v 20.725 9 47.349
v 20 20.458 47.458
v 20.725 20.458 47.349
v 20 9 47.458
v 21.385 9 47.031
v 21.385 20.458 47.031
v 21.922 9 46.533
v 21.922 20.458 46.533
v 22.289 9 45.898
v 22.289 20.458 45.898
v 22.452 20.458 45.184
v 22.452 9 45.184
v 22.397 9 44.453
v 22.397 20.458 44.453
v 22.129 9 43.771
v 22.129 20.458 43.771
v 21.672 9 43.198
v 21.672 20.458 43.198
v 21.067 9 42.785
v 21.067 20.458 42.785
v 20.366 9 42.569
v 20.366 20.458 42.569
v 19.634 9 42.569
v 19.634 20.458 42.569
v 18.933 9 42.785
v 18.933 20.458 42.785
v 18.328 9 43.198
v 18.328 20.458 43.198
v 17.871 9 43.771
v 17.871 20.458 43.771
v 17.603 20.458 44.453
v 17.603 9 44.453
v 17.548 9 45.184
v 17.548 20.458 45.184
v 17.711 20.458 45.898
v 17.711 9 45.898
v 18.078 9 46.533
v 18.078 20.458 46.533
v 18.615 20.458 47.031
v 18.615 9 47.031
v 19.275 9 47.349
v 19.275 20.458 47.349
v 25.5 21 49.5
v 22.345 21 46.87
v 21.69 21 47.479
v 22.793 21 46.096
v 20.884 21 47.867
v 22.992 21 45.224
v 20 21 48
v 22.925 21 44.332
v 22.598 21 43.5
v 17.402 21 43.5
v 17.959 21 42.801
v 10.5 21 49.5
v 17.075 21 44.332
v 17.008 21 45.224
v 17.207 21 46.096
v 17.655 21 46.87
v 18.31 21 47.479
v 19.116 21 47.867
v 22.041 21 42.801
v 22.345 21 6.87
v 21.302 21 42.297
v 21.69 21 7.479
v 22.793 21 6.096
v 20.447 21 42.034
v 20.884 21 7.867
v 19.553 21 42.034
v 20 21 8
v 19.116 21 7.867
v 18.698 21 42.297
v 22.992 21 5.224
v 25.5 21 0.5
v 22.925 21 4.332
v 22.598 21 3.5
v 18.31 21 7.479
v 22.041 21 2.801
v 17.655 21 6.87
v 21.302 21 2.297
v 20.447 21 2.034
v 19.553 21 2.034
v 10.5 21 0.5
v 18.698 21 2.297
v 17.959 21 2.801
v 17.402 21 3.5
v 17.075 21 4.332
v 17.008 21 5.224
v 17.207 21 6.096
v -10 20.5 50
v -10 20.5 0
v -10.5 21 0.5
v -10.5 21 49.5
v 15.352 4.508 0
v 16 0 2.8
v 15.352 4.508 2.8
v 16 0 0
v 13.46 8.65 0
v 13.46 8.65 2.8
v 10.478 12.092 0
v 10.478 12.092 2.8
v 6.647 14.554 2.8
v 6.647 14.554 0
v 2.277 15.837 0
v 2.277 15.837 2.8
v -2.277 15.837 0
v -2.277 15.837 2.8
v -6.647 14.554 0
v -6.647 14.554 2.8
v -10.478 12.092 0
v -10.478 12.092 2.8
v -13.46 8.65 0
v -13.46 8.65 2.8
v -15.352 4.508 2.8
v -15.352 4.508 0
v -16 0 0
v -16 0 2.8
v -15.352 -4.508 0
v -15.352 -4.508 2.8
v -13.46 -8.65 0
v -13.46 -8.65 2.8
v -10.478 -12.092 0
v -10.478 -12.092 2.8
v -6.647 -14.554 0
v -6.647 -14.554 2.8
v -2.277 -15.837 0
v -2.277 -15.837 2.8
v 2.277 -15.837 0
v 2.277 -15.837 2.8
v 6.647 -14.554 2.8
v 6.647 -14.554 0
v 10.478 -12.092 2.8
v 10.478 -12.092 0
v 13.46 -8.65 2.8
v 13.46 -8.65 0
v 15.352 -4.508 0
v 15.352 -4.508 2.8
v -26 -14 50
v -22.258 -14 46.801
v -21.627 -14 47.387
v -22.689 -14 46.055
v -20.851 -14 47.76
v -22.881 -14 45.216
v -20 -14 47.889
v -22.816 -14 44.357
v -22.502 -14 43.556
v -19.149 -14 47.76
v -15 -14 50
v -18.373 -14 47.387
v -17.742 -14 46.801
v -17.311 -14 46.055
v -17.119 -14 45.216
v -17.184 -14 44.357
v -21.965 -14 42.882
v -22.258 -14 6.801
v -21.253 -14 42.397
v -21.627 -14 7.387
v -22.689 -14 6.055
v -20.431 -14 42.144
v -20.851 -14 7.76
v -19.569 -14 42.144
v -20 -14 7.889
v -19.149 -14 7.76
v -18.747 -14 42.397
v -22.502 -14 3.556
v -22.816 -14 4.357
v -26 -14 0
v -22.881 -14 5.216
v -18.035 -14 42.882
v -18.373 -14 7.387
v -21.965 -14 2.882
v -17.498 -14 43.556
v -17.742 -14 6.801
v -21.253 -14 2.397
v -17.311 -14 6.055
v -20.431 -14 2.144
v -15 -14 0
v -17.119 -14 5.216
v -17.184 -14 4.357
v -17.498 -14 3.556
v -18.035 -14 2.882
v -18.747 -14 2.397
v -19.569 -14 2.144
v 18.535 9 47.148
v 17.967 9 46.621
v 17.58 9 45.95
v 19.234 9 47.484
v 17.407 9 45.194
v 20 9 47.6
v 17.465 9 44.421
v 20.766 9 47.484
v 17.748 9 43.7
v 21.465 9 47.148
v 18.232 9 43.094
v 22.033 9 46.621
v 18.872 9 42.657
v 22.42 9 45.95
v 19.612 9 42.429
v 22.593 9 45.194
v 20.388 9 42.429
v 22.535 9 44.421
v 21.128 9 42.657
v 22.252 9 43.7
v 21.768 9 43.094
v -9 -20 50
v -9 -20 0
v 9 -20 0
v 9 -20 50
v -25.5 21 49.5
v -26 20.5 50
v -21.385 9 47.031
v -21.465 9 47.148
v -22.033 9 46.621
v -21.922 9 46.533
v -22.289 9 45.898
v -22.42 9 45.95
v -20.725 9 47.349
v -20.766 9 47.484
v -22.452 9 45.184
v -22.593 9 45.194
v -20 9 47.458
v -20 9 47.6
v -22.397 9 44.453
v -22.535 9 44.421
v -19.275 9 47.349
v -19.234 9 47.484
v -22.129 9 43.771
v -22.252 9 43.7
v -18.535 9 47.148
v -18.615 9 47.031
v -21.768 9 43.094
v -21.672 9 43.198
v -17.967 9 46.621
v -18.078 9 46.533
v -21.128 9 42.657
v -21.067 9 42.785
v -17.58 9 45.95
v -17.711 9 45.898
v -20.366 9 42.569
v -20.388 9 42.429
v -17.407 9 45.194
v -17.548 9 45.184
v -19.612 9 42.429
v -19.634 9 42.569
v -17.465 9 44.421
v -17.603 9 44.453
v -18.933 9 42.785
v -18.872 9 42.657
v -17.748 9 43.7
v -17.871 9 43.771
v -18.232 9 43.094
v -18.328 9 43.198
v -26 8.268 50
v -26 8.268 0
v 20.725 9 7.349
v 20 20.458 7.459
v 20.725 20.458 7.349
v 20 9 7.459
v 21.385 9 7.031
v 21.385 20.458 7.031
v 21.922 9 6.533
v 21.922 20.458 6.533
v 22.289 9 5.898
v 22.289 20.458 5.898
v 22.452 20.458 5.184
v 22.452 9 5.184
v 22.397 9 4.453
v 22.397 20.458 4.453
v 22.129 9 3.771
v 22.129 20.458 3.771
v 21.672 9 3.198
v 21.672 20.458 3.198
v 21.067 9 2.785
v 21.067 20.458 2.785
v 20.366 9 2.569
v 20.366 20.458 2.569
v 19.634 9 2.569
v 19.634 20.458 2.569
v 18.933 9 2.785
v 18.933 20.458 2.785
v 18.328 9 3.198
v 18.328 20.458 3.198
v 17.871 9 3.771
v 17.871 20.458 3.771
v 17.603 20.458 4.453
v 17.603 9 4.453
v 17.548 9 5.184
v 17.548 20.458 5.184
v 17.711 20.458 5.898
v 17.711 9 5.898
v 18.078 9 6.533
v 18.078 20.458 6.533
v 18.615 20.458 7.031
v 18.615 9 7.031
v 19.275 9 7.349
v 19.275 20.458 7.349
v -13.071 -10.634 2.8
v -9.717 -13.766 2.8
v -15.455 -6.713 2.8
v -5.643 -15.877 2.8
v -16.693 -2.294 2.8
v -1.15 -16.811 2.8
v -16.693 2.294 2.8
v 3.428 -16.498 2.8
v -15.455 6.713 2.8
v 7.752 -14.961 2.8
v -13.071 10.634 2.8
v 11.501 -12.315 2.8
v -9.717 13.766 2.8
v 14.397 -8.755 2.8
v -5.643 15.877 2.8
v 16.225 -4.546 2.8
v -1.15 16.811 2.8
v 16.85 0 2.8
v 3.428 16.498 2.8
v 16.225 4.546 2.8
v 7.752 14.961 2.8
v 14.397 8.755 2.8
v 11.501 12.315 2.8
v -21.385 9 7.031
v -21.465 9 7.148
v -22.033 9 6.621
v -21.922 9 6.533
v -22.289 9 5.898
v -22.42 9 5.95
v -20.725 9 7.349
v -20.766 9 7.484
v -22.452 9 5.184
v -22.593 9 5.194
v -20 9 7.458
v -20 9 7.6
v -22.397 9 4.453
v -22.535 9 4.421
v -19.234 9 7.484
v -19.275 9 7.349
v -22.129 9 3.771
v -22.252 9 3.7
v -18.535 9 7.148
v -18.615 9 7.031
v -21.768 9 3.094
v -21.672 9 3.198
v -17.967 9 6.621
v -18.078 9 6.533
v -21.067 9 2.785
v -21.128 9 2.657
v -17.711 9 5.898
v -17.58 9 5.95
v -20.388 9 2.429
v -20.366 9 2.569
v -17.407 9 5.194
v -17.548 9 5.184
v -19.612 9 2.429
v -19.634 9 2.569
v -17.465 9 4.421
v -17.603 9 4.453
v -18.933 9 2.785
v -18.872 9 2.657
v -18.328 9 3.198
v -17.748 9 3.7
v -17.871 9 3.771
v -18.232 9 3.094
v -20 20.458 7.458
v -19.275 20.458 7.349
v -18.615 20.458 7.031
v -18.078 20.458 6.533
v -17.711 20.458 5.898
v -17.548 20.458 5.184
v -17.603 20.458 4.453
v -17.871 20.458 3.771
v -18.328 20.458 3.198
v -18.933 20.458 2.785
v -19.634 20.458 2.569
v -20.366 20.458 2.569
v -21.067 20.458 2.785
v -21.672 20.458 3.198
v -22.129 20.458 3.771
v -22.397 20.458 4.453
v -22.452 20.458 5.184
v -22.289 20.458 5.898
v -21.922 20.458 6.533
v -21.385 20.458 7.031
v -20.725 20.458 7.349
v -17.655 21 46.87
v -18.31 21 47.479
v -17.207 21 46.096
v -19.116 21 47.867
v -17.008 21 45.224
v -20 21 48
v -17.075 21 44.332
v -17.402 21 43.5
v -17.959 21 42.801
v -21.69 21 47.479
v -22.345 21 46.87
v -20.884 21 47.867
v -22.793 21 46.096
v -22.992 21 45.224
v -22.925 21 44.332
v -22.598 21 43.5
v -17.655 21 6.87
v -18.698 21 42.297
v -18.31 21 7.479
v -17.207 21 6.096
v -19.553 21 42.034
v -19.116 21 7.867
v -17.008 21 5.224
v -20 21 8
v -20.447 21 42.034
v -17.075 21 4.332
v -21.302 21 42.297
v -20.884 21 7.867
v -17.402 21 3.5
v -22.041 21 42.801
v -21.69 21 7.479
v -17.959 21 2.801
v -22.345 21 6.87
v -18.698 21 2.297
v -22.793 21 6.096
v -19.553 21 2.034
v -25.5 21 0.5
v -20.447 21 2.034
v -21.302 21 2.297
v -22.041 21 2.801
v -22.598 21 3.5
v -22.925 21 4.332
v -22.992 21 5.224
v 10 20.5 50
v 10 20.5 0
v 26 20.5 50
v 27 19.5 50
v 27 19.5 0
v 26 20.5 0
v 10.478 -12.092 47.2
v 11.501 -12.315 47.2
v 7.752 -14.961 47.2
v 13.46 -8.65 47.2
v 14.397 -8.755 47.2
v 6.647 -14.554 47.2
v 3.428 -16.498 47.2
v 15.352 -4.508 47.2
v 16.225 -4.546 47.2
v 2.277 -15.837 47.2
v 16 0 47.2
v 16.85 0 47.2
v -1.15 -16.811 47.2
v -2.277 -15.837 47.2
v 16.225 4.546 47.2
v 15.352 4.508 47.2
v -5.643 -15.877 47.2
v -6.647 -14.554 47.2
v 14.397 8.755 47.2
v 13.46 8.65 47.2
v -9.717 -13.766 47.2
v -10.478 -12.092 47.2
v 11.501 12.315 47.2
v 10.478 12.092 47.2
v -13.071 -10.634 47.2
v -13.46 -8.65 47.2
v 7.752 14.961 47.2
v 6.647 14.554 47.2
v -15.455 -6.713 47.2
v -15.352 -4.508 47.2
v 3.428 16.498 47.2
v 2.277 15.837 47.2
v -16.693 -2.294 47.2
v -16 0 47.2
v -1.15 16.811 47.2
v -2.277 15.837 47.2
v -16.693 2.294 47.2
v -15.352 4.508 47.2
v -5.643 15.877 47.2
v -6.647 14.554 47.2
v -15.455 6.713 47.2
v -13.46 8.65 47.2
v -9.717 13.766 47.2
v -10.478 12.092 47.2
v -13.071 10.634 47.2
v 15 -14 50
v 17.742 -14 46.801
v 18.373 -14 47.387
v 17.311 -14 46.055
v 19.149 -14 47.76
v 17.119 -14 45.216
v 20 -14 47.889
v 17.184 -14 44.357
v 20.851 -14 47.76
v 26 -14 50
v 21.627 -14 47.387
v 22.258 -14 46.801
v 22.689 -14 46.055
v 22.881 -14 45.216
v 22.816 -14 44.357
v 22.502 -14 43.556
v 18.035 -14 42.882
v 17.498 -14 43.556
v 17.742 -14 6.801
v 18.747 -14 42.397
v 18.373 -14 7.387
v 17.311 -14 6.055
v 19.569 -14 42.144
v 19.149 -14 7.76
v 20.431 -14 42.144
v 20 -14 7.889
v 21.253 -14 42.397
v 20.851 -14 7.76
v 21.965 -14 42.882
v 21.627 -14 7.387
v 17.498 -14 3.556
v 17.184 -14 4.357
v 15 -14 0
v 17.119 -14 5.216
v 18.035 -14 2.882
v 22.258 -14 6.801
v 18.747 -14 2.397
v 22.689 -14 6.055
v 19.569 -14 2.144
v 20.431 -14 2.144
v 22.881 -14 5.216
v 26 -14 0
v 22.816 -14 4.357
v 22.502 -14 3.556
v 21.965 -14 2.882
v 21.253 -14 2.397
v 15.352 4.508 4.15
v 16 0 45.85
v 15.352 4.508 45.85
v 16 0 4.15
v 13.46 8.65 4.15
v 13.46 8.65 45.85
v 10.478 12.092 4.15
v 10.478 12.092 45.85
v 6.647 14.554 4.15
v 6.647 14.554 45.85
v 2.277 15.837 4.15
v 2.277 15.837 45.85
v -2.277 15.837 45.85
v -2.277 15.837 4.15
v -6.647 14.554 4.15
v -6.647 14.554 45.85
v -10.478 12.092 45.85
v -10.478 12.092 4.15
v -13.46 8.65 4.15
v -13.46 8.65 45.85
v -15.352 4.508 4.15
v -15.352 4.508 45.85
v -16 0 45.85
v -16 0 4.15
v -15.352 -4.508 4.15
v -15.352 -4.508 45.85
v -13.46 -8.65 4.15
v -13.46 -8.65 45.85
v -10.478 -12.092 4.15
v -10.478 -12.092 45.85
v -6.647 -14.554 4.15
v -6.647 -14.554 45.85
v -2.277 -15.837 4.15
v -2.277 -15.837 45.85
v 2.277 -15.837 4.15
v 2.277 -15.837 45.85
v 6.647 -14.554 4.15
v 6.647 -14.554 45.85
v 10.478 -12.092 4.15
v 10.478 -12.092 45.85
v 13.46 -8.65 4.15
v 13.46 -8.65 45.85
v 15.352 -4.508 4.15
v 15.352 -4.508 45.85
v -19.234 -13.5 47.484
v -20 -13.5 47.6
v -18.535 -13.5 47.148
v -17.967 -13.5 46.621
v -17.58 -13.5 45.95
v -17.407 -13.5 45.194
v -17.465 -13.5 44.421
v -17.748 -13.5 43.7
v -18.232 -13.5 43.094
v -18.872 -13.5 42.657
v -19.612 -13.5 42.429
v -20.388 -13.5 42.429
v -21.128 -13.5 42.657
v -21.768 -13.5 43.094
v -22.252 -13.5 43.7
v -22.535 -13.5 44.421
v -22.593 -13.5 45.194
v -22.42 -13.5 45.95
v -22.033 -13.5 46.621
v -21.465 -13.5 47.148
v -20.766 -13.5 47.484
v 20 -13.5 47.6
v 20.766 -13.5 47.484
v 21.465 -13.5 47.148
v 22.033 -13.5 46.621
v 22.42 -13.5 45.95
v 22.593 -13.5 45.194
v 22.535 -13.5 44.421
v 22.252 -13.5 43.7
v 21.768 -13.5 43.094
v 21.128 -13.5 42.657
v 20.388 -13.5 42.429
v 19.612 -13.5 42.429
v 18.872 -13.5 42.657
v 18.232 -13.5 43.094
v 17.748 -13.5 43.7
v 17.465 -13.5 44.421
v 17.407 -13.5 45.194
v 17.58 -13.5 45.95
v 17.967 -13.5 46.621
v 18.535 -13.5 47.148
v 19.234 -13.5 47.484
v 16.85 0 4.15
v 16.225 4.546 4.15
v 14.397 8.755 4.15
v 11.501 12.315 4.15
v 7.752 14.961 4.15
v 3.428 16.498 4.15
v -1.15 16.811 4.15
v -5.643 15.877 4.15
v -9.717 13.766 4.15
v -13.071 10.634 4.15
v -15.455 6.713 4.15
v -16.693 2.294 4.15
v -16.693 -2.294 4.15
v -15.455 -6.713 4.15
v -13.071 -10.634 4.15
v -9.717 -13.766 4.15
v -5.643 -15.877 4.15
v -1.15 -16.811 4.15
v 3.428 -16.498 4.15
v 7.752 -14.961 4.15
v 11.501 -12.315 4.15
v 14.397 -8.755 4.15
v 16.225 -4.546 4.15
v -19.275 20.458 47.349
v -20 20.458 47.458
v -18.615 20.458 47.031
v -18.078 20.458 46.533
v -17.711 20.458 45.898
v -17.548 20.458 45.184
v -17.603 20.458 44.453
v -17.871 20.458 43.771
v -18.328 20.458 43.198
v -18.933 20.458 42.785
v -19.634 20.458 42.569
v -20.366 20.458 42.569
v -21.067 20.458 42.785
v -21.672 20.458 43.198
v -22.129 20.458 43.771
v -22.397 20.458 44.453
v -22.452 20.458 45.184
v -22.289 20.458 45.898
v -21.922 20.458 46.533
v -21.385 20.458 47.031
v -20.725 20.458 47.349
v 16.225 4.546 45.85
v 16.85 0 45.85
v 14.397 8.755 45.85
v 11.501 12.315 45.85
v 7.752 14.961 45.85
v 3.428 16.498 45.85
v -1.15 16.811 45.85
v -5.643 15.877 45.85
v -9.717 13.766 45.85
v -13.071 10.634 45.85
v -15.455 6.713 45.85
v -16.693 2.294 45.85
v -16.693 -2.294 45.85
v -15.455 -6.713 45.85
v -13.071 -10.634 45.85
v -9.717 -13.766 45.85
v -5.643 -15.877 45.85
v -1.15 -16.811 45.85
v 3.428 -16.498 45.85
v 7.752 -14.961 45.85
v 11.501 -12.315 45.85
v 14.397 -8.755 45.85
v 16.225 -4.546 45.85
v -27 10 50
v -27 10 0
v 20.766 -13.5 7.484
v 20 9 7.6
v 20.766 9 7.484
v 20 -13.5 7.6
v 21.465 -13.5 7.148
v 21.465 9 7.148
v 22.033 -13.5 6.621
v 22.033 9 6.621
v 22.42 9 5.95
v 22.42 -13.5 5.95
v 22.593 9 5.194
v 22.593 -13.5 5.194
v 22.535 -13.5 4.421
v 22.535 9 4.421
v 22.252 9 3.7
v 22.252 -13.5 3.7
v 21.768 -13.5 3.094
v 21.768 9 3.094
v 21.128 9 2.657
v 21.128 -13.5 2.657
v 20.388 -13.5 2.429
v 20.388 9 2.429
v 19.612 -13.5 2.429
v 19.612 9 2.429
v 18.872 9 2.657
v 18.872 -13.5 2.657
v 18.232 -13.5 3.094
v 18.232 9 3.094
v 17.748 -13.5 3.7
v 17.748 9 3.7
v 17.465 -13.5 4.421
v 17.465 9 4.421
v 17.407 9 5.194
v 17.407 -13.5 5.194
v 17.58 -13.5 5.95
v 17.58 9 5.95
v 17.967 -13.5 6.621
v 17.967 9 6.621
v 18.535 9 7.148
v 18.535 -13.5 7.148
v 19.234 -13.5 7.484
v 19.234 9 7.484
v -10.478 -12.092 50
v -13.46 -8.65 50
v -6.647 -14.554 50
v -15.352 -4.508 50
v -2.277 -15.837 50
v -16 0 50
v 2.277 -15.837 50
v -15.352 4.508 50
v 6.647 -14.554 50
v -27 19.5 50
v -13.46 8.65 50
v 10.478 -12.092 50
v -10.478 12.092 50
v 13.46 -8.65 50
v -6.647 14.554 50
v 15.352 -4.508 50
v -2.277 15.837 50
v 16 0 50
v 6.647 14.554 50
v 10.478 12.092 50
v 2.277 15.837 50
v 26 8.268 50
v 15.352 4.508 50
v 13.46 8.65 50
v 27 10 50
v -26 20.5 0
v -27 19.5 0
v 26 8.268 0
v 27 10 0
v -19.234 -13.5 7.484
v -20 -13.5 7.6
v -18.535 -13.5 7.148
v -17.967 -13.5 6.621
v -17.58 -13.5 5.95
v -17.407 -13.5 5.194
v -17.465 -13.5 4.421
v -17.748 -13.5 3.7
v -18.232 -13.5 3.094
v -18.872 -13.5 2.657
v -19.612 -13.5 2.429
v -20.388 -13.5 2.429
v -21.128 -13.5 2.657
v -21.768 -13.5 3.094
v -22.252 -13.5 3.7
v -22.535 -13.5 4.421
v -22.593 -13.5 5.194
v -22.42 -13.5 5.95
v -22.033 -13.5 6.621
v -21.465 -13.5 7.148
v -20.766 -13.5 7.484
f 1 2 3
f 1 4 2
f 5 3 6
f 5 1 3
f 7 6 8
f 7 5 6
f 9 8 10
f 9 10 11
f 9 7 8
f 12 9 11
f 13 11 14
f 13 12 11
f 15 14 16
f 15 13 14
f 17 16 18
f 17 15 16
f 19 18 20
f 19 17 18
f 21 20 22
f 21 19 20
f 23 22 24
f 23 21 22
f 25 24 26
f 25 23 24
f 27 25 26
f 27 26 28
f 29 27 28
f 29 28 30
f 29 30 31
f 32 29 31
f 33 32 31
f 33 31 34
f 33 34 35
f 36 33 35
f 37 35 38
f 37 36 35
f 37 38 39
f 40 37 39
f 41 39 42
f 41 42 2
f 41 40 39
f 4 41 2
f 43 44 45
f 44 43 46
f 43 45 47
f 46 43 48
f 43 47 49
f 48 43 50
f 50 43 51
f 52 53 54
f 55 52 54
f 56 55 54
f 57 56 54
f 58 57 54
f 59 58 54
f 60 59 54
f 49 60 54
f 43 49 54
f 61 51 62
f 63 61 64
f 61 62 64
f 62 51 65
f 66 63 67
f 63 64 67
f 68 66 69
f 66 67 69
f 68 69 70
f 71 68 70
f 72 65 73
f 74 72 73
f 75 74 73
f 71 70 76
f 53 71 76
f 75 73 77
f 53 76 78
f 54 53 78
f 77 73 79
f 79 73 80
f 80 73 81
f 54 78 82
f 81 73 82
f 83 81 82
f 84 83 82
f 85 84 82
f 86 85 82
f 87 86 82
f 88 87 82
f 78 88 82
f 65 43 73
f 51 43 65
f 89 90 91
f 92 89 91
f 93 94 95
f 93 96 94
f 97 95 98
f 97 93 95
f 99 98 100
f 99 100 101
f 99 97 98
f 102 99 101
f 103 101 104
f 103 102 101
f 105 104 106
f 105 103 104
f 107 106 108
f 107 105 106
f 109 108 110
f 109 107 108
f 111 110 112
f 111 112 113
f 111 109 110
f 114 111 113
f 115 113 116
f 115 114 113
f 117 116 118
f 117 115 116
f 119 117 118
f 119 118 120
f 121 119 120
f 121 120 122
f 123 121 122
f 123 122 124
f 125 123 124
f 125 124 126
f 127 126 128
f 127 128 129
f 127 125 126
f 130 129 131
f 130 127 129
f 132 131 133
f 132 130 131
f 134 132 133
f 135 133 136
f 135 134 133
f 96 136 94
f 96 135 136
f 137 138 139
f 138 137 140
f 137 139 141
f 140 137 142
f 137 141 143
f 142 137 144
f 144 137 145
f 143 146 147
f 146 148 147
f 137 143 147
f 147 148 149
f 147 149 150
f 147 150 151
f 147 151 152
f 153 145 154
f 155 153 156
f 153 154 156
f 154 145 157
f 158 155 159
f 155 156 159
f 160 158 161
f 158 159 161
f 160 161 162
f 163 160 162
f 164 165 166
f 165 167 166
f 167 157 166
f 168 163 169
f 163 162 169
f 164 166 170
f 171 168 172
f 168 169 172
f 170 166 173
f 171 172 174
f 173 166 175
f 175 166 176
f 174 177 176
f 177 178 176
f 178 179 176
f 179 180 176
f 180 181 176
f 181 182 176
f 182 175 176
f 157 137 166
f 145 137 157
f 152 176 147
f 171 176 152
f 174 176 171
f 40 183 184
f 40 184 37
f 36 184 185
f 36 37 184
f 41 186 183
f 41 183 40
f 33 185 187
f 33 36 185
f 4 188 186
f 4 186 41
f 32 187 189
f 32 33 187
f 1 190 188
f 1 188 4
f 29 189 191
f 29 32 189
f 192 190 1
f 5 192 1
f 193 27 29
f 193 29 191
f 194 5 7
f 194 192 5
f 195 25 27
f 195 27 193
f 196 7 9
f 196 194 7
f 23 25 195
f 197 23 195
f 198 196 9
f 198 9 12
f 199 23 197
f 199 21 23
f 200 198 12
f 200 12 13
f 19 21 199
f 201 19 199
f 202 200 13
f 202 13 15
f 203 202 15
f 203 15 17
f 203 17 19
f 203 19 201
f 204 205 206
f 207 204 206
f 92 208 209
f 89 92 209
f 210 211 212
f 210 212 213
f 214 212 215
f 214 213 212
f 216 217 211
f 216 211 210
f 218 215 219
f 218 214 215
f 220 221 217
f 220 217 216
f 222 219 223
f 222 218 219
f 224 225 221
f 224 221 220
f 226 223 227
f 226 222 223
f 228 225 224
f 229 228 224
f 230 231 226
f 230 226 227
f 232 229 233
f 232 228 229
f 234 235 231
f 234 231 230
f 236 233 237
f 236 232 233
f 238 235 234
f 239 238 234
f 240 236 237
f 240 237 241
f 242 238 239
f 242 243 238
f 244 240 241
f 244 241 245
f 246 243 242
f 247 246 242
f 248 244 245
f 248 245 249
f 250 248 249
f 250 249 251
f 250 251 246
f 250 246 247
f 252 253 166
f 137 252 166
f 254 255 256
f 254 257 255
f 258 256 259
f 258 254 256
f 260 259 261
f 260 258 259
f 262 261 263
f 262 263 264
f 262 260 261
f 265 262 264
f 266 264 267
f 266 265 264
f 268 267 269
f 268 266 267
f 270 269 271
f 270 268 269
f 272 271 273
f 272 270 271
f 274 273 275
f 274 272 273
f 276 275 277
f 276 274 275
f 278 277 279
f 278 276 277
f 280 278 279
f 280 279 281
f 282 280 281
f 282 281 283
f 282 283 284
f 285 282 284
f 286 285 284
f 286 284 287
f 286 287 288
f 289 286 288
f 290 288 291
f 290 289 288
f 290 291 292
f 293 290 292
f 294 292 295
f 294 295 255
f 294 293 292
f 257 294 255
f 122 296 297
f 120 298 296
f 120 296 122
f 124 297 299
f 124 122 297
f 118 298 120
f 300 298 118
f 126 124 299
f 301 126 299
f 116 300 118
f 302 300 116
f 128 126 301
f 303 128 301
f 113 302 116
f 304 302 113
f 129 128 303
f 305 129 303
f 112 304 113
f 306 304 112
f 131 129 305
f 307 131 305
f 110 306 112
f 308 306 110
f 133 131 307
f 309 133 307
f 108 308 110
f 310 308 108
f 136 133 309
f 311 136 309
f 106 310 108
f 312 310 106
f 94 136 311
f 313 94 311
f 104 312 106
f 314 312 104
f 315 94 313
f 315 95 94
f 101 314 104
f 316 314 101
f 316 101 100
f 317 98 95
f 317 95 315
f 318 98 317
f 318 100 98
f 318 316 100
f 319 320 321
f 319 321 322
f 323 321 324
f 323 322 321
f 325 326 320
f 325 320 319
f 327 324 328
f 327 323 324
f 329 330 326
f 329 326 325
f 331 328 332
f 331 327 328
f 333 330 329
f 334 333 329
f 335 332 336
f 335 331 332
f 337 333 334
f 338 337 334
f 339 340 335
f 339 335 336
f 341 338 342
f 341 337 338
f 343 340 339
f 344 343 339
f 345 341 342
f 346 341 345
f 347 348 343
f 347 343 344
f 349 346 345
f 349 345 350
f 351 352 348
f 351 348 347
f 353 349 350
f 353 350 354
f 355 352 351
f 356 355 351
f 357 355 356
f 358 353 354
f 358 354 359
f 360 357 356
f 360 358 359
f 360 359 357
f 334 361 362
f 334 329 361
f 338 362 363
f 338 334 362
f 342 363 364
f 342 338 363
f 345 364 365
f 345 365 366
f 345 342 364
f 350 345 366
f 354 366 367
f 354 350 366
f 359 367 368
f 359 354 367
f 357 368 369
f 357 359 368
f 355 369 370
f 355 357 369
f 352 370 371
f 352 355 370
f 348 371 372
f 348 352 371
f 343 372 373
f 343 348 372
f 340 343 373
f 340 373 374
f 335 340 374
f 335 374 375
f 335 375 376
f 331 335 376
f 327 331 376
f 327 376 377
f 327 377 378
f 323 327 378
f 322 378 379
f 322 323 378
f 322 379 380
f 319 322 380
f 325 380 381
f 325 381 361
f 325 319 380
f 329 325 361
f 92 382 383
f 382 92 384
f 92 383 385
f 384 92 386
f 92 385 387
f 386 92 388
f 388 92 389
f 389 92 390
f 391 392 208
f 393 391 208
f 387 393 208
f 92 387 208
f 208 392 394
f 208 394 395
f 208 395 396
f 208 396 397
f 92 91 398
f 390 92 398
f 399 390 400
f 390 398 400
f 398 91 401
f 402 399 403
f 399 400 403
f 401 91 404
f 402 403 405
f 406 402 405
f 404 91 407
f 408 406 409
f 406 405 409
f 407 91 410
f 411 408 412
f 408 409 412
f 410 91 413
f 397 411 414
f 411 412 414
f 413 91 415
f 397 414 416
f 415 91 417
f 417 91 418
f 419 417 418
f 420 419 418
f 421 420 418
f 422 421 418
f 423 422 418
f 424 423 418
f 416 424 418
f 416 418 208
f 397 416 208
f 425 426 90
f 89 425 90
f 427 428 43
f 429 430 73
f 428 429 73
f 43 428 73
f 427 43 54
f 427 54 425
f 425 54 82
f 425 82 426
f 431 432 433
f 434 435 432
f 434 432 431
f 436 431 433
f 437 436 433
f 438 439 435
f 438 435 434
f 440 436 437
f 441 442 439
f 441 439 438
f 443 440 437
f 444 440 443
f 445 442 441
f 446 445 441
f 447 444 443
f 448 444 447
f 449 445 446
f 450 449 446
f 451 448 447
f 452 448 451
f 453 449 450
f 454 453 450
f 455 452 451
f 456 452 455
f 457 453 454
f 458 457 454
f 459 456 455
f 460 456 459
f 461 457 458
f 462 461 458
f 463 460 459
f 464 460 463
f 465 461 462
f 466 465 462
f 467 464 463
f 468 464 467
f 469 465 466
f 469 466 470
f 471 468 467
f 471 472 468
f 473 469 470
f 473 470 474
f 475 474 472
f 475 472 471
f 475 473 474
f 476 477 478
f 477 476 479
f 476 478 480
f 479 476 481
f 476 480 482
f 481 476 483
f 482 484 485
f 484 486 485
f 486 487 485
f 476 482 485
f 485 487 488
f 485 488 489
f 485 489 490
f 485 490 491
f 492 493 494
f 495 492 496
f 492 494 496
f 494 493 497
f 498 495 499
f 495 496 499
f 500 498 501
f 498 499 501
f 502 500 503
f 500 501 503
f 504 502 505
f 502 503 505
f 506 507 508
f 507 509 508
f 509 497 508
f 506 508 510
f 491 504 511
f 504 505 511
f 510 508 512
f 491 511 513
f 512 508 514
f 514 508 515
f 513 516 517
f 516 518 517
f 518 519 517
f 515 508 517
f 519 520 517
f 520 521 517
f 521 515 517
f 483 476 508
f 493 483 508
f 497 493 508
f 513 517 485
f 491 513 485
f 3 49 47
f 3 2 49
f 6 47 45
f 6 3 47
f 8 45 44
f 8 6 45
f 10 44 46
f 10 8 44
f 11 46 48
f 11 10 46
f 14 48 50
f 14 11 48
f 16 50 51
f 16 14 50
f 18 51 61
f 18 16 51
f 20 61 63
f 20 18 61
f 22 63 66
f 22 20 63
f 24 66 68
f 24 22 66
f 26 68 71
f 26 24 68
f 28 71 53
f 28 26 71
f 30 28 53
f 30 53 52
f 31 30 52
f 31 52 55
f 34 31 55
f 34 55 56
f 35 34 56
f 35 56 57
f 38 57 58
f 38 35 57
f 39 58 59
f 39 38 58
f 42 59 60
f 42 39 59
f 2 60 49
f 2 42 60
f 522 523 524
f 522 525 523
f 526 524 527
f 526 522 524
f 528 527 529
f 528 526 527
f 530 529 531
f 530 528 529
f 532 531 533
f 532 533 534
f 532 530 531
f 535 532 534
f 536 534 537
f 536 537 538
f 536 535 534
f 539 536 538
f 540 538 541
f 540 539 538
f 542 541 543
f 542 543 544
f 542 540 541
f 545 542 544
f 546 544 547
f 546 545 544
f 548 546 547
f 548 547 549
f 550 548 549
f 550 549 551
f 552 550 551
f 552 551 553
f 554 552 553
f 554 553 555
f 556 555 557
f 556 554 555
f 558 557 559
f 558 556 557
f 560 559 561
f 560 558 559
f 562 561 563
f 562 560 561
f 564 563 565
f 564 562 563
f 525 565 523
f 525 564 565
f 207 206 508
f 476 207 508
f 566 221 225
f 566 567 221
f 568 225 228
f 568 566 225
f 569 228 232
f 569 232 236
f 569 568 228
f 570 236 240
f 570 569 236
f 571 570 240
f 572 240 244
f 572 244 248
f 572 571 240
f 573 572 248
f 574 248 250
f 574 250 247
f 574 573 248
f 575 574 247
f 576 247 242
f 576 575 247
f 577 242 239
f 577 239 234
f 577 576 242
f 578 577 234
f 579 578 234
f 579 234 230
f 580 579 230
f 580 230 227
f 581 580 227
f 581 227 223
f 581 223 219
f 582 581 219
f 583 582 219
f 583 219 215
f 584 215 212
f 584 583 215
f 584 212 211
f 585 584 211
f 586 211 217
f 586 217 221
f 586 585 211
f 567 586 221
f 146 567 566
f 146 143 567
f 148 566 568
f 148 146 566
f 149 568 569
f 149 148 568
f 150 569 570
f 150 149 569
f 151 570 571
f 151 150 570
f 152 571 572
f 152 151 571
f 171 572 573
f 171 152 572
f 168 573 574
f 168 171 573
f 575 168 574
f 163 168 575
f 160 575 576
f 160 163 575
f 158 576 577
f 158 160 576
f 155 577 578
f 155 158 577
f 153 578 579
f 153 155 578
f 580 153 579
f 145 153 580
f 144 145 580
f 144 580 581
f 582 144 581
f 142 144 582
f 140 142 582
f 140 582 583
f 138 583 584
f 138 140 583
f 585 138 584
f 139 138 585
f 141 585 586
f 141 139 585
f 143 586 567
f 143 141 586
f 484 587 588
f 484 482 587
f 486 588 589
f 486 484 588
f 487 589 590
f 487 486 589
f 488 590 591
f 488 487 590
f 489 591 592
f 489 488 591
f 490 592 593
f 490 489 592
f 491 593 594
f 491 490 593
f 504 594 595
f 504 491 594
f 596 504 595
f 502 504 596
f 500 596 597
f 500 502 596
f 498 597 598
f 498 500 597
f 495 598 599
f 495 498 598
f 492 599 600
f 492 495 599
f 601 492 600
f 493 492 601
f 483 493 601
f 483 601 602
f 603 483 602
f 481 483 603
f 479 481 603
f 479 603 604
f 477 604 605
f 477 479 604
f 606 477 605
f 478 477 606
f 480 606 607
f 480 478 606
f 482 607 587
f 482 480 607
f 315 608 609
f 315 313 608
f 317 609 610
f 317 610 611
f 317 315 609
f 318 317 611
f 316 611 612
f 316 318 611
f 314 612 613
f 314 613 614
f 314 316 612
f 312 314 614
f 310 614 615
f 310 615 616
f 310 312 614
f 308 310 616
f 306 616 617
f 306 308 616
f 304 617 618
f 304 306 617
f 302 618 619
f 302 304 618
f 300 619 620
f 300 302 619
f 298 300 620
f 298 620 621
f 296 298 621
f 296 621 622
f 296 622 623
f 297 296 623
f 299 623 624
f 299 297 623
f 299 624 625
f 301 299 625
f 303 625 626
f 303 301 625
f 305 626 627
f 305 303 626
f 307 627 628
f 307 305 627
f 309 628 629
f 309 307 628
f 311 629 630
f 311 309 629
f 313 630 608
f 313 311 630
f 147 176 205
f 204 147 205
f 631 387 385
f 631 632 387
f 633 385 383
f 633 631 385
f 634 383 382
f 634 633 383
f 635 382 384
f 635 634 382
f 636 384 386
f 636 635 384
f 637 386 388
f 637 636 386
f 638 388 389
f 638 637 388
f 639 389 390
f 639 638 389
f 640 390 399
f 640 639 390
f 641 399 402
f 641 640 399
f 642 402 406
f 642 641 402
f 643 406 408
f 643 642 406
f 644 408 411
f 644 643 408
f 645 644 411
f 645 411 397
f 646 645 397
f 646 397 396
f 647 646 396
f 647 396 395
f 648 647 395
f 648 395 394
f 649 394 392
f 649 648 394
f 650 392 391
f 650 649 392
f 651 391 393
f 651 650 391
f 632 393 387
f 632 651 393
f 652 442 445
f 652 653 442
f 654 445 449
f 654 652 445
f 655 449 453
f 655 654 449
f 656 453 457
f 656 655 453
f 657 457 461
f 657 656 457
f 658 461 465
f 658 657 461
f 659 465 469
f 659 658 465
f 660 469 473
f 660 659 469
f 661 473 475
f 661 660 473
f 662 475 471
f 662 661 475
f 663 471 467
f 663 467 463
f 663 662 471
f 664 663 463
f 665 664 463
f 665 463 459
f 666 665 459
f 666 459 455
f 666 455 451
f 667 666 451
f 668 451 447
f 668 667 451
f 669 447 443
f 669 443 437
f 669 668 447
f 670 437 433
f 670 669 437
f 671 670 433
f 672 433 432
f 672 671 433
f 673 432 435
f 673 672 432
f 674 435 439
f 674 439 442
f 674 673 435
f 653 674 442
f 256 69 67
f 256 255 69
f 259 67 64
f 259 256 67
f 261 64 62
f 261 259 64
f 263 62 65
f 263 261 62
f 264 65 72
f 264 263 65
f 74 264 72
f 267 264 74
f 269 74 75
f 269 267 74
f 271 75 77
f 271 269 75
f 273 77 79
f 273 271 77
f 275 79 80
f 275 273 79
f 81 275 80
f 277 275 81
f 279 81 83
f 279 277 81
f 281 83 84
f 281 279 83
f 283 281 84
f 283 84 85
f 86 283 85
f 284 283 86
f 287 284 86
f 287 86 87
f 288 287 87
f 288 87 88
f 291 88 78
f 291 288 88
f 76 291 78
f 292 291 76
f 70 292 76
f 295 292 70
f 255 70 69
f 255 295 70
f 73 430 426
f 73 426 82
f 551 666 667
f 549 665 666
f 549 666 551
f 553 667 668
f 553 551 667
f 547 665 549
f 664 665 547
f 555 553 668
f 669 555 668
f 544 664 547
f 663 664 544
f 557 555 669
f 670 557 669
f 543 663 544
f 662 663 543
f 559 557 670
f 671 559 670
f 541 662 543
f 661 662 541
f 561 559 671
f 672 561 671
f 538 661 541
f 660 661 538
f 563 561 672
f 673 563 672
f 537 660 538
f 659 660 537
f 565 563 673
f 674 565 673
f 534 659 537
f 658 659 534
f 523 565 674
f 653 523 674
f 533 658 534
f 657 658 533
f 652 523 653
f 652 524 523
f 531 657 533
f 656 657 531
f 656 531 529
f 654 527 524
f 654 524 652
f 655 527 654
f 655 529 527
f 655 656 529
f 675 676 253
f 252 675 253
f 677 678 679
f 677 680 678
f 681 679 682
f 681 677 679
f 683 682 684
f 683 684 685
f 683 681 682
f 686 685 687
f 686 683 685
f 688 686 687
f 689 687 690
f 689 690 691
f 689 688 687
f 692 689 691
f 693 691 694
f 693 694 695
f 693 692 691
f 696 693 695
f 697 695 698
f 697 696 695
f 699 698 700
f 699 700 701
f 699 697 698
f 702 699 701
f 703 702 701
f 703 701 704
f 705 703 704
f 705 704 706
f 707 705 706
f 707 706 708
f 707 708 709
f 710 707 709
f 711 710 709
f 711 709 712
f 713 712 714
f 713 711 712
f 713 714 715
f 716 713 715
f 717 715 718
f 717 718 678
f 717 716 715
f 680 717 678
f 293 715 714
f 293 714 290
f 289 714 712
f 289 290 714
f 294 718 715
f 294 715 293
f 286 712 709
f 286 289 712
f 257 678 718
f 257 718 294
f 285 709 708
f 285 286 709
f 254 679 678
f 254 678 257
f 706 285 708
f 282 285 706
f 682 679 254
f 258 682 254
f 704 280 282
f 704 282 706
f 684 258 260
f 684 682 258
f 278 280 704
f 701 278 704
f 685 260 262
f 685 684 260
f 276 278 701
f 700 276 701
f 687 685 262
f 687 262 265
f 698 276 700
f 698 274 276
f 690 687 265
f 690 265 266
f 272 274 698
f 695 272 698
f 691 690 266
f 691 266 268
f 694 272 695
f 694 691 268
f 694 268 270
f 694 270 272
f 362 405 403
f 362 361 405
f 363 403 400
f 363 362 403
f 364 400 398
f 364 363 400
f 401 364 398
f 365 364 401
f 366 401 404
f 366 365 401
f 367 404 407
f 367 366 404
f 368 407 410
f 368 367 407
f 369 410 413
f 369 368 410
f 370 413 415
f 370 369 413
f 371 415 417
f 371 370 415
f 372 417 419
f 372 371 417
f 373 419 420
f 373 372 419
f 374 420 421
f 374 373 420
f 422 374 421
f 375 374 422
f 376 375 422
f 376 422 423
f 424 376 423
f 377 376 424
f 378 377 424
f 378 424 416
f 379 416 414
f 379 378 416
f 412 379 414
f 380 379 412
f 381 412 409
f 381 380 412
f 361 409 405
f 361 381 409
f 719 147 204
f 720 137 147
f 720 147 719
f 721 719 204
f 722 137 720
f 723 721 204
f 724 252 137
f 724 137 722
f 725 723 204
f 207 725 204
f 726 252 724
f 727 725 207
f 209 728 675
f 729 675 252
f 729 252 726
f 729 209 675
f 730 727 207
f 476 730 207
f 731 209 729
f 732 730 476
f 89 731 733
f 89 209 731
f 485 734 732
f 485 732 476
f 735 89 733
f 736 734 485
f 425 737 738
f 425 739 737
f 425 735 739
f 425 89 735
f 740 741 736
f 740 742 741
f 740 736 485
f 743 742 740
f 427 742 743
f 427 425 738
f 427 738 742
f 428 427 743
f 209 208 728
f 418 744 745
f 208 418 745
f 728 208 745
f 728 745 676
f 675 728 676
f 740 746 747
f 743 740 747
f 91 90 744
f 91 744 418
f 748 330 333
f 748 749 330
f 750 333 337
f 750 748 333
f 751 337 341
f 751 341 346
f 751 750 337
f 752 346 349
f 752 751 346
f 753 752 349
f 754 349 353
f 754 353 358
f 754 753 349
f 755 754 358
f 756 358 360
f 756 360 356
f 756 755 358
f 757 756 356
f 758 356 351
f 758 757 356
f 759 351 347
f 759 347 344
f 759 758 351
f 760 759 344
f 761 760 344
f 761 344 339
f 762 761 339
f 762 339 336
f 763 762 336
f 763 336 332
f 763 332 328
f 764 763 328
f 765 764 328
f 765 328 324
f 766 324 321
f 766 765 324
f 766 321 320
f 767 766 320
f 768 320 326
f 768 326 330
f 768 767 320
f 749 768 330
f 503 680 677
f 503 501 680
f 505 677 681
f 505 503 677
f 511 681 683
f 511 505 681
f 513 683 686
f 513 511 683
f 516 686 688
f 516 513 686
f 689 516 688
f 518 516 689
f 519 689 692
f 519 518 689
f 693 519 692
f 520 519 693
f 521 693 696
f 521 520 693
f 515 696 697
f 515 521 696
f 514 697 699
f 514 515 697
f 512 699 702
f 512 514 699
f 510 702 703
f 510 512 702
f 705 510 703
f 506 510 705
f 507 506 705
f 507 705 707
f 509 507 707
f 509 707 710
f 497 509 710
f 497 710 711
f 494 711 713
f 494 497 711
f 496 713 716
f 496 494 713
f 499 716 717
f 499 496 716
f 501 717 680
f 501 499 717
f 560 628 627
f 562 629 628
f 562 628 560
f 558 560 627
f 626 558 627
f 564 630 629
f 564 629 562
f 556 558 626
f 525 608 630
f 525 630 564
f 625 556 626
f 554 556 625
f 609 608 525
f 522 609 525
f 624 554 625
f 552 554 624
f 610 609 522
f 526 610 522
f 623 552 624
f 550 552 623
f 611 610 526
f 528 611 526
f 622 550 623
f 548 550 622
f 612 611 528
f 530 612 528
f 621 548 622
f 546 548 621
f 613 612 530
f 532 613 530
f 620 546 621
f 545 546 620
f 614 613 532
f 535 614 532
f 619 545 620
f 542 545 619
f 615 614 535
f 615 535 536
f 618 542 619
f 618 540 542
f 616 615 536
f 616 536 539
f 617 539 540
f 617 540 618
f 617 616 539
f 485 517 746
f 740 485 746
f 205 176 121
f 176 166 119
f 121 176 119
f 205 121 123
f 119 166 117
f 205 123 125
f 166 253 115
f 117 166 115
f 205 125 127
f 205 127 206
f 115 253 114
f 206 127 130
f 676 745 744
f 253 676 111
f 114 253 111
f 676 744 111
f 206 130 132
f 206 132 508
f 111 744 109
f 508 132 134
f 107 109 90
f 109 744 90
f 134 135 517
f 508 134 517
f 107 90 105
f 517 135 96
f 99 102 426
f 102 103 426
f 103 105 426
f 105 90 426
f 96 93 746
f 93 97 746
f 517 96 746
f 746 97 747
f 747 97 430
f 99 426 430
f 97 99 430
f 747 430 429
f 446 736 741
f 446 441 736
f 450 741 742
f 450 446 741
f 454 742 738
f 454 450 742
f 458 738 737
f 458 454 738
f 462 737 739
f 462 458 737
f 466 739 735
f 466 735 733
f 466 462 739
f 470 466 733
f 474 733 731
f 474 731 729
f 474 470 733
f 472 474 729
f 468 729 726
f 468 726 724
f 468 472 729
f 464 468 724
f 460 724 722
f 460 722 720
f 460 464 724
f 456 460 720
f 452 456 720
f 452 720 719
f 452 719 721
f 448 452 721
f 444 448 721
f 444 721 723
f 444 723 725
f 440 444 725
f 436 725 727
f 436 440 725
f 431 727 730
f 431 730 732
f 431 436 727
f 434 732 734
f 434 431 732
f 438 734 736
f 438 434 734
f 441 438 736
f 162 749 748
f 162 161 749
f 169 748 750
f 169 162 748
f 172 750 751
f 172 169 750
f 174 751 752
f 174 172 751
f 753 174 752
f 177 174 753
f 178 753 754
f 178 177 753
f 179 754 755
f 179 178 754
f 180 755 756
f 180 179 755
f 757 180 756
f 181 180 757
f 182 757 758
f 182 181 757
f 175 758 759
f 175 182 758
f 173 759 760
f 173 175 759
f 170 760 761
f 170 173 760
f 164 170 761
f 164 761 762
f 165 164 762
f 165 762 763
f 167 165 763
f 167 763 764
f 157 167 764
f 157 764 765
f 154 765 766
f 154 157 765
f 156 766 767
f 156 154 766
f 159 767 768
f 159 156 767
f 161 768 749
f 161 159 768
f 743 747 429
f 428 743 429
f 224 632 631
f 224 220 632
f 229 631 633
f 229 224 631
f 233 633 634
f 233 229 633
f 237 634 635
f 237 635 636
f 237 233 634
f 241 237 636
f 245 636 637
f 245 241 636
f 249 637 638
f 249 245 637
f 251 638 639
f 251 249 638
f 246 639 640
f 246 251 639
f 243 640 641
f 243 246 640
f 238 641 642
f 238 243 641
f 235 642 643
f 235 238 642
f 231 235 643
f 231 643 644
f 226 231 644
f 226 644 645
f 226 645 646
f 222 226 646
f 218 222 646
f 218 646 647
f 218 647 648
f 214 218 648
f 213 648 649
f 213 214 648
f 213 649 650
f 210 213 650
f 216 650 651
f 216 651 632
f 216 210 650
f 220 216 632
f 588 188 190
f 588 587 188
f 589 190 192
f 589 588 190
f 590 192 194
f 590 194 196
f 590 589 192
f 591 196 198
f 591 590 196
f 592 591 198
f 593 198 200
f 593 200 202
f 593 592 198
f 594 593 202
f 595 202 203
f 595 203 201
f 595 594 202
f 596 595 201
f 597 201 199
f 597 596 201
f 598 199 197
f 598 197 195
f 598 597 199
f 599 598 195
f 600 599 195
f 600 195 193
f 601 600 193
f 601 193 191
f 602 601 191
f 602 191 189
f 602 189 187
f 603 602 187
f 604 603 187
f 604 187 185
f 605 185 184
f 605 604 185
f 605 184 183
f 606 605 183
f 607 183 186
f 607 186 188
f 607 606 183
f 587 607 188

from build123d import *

# Parameters (mm, degrees)
EXTRUDE_1_DEPTH          = 50
CUT_EXTRUDE_1_DEPTH      = 27
CUT_EXTRUDE_1_DEPTH_BACK = 27
SKETCH_2_W               = 75
SKETCH_2_H               = 82


with BuildPart() as part:
    # 草图1 → 凸台-拉伸1 (new body)
    with BuildSketch(Plane.XY):
        Polygon((-27, 19.5), (-27, 10), (-26, 8.267949192), (-26, -14), (-15, -14), (-9, -20), (9, -20), (15, -14), (26, -14), (26, 8.267949192), (27, 10), (27, 19.5), (25.5, 21), (10.5, 21), (10, 20.5), (-10, 20.5), (-10.5, 21), (-25.5, 21), align=None)
    extrude(amount=EXTRUDE_1_DEPTH)

    # 草图2 → 切除-拉伸1 (cut, two sides: drawn at the far end of the back side and taken through both)
    with BuildSketch(Plane(origin=(0, 0, 0), x_dir=(0, 0, -1), z_dir=(1, 0, 0)).offset(-CUT_EXTRUDE_1_DEPTH_BACK)):
        with Locations((-25, 0)):
            Rectangle(SKETCH_2_W, SKETCH_2_H)
        Polygon((-50, -20), (0, -20), (0, 20.5), (-0.5, 21), (-49.5, 21), (-50, 20.5), align=None, mode=Mode.SUBTRACT)
    extrude(amount=CUT_EXTRUDE_1_DEPTH + CUT_EXTRUDE_1_DEPTH_BACK, mode=Mode.SUBTRACT)

    # 草图3 → 切除-旋转1 (revolve, cut)
    with BuildSketch(Plane(origin=(0, 0, 0), x_dir=(0, 0, -1), z_dir=(1, 0, 0))):
        Polygon((-50, 0), (-50, 16), (-47.2, 16), (-47.2, 16.85), (-45.85, 16.85), (-45.85, 16), (-4.15, 16), (-4.15, 16.85), (-2.8, 16.85), (-2.8, 16), (0, 16), (0, 0), align=None)
    revolve(axis=Axis((0, 0, 0), (0, 0, 1)), mode=Mode.SUBTRACT)

    # 草图4 → 切除-旋转2 (revolve, cut)
    with BuildSketch(Plane(origin=(20, 0, 0), x_dir=(0, 0, -1), z_dir=(1, 0, 0))):
        Polygon((-5, 21), (-2, 21), (-2.5415, 20.4585), (-2.5415, 9), (-2.4, 9), (-2.4, -13.5), (-2.111324865, -14), (-5, -14), align=None)
    revolve(axis=Axis((20, -14, 5), (0, 1, 0)), mode=Mode.SUBTRACT)

    # 草图5 → 切除-旋转3 (revolve, cut)
    with BuildSketch(Plane(origin=(20, 0, 0), x_dir=(0, 0, -1), z_dir=(1, 0, 0))):
        Polygon((-45, 21), (-42, 21), (-42.5415, 20.4585), (-42.5415, 9), (-42.4, 9), (-42.4, -13.5), (-42.111324865, -14), (-45, -14), align=None)
    revolve(axis=Axis((20, -14, 45), (0, 1, 0)), mode=Mode.SUBTRACT)

    # 草图6 → 切除-旋转4 (revolve, cut)
    with BuildSketch(Plane(origin=(-20, 0, 0), x_dir=(0, 0, -1), z_dir=(1, 0, 0))):
        Polygon((-5, 21), (-2, 21), (-2.5415, 20.4585), (-2.5415, 9), (-2.4, 9), (-2.4, -13.5), (-2.111324865, -14), (-5, -14), align=None)
    revolve(axis=Axis((-20, -14, 5), (0, 1, 0)), mode=Mode.SUBTRACT)

    # 草图7 → 切除-旋转5 (revolve, cut)
    with BuildSketch(Plane(origin=(-20, 0, 0), x_dir=(0, 0, -1), z_dir=(1, 0, 0))):
        Polygon((-45, 21), (-42, 21), (-42.5415, 20.4585), (-42.5415, 9), (-42.4, 9), (-42.4, -13.5), (-42.111324865, -14), (-45, -14), align=None)
    revolve(axis=Axis((-20, -14, 45), (0, 1, 0)), mode=Mode.SUBTRACT)


solid = part.part
